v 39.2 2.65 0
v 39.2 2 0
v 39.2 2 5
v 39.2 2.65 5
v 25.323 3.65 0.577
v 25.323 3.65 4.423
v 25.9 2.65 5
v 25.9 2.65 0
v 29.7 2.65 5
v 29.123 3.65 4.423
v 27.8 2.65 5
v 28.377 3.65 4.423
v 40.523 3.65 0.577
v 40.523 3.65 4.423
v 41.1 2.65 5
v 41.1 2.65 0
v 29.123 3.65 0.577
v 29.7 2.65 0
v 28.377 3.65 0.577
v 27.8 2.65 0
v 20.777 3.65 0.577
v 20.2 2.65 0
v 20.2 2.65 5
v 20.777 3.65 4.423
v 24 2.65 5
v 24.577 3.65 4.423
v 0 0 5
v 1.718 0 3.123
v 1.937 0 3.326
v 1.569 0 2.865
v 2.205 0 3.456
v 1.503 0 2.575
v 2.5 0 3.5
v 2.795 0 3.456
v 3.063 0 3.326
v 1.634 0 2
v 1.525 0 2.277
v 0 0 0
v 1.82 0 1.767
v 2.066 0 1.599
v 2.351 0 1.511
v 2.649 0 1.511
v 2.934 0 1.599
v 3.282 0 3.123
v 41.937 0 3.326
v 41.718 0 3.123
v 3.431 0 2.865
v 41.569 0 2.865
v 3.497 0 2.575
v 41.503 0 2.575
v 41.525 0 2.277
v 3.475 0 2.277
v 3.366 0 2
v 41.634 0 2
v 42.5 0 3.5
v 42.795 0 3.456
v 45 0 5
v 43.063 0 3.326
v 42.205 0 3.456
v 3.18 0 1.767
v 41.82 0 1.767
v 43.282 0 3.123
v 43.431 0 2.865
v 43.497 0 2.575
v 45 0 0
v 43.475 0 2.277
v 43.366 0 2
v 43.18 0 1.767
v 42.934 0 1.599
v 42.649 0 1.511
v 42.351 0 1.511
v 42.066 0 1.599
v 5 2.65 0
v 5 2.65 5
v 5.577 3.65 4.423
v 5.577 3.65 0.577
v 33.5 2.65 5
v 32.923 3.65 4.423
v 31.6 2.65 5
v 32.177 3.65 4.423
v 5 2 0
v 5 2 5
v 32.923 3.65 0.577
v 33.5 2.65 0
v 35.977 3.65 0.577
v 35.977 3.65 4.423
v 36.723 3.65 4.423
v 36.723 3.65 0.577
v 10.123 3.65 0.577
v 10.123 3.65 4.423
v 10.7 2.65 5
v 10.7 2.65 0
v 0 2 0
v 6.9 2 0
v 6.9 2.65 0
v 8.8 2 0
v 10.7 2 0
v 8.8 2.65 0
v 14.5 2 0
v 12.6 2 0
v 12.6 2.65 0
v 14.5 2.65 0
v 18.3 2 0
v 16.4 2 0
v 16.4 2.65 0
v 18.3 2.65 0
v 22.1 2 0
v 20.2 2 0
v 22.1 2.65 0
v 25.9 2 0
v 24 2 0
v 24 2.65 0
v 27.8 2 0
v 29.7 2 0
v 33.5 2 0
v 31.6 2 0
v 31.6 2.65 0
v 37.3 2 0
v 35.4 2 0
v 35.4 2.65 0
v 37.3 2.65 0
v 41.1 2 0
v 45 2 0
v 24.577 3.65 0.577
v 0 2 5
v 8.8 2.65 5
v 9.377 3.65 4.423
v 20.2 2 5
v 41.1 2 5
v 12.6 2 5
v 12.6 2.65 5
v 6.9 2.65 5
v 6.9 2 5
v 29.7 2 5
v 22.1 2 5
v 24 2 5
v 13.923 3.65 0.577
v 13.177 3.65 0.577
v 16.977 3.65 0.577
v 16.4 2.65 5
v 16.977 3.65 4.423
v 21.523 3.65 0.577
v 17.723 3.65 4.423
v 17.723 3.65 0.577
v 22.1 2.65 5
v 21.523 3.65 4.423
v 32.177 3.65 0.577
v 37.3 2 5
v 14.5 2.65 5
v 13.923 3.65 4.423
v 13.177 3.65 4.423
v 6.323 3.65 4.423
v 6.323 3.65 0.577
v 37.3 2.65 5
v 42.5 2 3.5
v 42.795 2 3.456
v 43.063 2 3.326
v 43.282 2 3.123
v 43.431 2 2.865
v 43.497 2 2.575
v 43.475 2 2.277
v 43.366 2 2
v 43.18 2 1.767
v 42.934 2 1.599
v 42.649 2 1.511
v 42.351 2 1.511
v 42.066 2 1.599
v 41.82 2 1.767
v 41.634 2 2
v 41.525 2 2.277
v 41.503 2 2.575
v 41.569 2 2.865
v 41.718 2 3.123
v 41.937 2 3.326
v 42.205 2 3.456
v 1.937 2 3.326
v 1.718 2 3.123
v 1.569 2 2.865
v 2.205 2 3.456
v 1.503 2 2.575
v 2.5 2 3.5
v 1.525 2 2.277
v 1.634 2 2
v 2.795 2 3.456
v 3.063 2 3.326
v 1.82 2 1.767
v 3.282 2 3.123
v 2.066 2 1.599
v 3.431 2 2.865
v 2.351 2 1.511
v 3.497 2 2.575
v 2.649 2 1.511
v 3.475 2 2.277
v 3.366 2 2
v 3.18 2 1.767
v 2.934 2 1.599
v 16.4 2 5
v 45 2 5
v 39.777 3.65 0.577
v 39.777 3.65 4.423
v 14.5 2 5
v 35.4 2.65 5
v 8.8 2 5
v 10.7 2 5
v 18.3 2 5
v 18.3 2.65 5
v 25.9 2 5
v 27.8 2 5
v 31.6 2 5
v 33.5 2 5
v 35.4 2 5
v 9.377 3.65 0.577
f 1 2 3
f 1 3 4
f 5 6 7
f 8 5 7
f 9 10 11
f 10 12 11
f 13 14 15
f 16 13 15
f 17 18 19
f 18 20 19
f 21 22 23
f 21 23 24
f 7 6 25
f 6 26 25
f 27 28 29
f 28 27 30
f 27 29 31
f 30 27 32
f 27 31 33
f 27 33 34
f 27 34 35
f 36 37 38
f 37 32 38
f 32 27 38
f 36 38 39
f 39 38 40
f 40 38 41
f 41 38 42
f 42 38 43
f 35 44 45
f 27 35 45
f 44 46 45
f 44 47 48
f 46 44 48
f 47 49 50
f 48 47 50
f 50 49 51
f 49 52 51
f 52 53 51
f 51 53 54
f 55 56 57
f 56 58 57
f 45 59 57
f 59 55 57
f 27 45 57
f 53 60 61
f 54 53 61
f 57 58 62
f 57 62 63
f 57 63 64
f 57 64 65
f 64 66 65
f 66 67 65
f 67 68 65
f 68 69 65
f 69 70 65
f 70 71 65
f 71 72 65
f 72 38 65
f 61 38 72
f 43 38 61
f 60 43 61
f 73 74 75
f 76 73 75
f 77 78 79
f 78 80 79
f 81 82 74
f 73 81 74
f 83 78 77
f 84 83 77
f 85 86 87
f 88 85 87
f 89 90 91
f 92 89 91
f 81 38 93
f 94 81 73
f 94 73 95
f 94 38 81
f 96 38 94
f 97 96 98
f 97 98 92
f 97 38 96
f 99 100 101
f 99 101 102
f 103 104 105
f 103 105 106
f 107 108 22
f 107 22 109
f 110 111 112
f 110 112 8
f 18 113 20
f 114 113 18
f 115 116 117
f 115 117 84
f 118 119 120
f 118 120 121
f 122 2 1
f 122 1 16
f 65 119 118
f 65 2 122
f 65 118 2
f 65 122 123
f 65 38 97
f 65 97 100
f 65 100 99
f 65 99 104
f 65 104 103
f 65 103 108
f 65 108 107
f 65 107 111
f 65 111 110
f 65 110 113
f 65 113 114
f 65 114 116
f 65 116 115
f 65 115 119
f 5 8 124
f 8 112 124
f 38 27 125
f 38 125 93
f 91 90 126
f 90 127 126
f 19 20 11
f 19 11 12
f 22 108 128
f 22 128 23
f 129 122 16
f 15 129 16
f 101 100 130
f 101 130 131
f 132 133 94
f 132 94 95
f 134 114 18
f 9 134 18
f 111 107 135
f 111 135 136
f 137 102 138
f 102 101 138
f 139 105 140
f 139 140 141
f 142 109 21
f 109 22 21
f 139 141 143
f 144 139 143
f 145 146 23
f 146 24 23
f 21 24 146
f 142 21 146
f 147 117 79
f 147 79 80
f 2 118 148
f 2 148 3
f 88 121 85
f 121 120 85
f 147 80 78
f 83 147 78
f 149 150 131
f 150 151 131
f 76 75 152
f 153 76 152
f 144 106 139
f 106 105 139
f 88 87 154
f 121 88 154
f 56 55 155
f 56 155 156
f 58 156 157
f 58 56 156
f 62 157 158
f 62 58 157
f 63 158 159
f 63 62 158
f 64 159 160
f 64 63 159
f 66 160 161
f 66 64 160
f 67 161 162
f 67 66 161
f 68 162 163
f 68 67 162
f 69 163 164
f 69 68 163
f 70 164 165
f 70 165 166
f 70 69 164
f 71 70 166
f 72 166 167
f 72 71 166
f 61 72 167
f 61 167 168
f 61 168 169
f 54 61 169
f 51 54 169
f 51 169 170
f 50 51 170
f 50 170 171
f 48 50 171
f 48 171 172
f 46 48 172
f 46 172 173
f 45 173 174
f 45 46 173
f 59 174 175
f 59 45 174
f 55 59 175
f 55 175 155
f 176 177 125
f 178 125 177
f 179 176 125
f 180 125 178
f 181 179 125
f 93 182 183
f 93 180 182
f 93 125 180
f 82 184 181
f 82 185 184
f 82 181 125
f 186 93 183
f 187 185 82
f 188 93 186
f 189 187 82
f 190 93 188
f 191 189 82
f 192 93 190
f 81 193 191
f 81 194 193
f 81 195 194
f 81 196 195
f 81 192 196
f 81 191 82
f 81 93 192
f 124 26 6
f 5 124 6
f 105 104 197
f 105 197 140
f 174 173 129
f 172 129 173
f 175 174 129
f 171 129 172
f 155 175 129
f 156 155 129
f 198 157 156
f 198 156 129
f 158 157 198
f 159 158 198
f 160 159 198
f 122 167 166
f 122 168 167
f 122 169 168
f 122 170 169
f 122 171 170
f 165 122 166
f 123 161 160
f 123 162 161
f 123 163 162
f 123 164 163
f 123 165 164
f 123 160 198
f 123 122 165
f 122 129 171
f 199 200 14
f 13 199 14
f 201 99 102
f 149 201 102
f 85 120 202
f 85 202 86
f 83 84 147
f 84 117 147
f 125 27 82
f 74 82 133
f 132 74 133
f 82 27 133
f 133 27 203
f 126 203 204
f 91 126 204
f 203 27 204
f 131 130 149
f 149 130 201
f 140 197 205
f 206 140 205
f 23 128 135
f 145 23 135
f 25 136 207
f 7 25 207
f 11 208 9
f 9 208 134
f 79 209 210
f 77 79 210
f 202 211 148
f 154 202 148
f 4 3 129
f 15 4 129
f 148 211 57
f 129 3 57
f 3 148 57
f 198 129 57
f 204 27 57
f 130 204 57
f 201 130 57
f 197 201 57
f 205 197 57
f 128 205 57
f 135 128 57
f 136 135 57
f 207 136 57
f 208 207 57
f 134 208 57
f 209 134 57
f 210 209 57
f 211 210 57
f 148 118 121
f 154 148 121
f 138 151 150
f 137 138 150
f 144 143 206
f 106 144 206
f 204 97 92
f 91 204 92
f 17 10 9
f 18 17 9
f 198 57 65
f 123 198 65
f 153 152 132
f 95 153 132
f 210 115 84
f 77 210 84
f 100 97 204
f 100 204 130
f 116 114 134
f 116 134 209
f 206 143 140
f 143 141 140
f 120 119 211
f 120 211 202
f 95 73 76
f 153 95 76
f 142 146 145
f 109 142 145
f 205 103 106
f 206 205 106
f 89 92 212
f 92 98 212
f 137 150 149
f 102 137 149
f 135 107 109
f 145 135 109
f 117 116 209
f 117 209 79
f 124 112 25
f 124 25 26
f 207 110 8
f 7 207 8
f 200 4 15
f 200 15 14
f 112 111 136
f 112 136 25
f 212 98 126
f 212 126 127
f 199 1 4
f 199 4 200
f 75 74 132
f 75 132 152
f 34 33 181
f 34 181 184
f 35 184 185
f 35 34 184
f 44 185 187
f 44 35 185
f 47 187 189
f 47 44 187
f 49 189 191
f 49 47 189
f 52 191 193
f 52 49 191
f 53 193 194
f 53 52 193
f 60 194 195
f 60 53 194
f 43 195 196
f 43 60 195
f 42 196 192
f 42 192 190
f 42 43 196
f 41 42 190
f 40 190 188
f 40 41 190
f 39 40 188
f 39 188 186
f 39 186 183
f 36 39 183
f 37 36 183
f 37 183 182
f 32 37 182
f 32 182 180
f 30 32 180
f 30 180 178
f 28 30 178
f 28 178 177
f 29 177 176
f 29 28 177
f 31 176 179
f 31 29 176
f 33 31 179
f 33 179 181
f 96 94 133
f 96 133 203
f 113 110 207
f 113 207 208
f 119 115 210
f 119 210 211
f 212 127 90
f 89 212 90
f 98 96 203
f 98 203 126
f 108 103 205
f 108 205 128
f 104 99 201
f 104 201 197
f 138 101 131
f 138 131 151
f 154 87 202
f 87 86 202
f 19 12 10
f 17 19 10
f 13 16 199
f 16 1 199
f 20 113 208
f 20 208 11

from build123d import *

# Parameters (mm, degrees)
SKETCH1_W                    = 45
SKETCH1_H                    = 5
SKETCH1_R                    = 1
BOSS_EXTRUDE1_DEPTH          = 2
SKETCH2_W                    = 1.9
SKETCH2_H                    = 1.65
BOSS_EXTRUDE2_DEPTH          = 5
CHAMFER1_SIZE                = 1
CHAMFER1_SIZE_2              = 0.577350269
LPATTERN1_COUNT              = 10
LPATTERN1_PITCH              = 3.8
CHAMFER1_OF_LPATTERN1_SIZE   = 1
CHAMFER1_OF_LPATTERN1_SIZE_2 = 0.577350269


with BuildPart() as part:
    # Sketch1 → Boss-Extrude1 (new body)
    with BuildSketch(Plane(origin=(0, 0, 0), x_dir=(1, 0, 0), z_dir=(0, 1, 0))):
        with Locations((22.5, -2.5)):
            Rectangle(SKETCH1_W, SKETCH1_H)
        with Locations(Location((2.5, -2.5, 0), (0, 0, 270))):
            Circle(SKETCH1_R, mode=Mode.SUBTRACT)
        with Locations(Location((42.5, -2.5, 0), (0, 0, 270))):
            Circle(SKETCH1_R, mode=Mode.SUBTRACT)
    extrude(amount=BOSS_EXTRUDE1_DEPTH)

    # Sketch2 → Boss-Extrude2 (add)
    with BuildSketch(Plane.XY.offset(5)):
        with Locations((5.95, 2.825)):
            Rectangle(SKETCH2_W, SKETCH2_H)
    boss_extrude2 = extrude(amount=-BOSS_EXTRUDE2_DEPTH)

    # Chamfer1
    # the kernel refuses this chamfer: 1, 0.577350269 mm, written as the material it takes off along each edge
    with BuildSketch(Plane(origin=(2.412914245, 3.65, 0), x_dir=(0, -0.9998132206222079, -0.019326765612700737), z_dir=(1, 0, 0))) as chamfer1_piece_1:
        Polygon((CHAMFER1_SIZE * 0.999813220622, -CHAMFER1_SIZE * 0.0193267656127), (-CHAMFER1_SIZE_2 * 0.019326765619, -CHAMFER1_SIZE_2 * 0.999813220951), (0, 0), align=None)
    extrude(amount=7.074171509, mode=Mode.SUBTRACT)
    with BuildSketch(Plane(origin=(2.412914245, 3.65, 5), x_dir=(0, -0.9998132206222079, 0.01932676561270115), z_dir=(1, 0, 0))) as chamfer1_piece_2:
        Polygon((CHAMFER1_SIZE * 0.999813220622, CHAMFER1_SIZE * 0.0193267656127), (-CHAMFER1_SIZE_2 * 0.019326765619, CHAMFER1_SIZE_2 * 0.999813220951), (0, 0), align=None)
    extrude(amount=7.074171509, mode=Mode.SUBTRACT)
    with BuildSketch(Plane(origin=(6.9, 3.65, 7.587085755), x_dir=(-0.9983227437537925, 0.0578938624026711, 0), z_dir=(0, 0, -1))) as chamfer1_piece_3:
        Polygon((CHAMFER1_SIZE_2 * 0.998322744082, -CHAMFER1_SIZE_2 * 0.0578938624217), (-CHAMFER1_SIZE * 0.0578938624027, -CHAMFER1_SIZE * 0.998322743754), (0, 0), align=None)
    extrude(amount=10.174171509, mode=Mode.SUBTRACT)
    with BuildSketch(Plane(origin=(5, 3.65, 7.587085755), x_dir=(-0.01932676561270115, -0.9998132206222079, 0), z_dir=(0, 0, -1))) as chamfer1_piece_4:
        Polygon((CHAMFER1_SIZE * 0.999813220622, -CHAMFER1_SIZE * 0.0193267656127), (-CHAMFER1_SIZE_2 * 0.019326765619, -CHAMFER1_SIZE_2 * 0.999813220951), (0, 0), align=None)
    extrude(amount=10.174171509, mode=Mode.SUBTRACT)

    # LPattern1: Boss-Extrude2 ×10
    with Locations(*[(i * LPATTERN1_PITCH, 0, 0) for i in range(1, LPATTERN1_COUNT)]):
        add(boss_extrude2)

    # Chamfer1 of LPattern1
    # the kernel refuses this chamfer: 1, 0.577350269 mm, written as the material it takes off along each edge
    with BuildSketch(Plane(origin=(6.212914245, 3.65, 0), x_dir=(0, -0.9998132206222079, -0.019326765612700737), z_dir=(1, 0, 0)), Plane(origin=(10.012914245, 3.65, 0), x_dir=(0, -0.9998132206222079, -0.019326765612700737), z_dir=(1, 0, 0)), Plane(origin=(13.812914245, 3.65, 0), x_dir=(0, -0.9998132206222079, -0.019326765612700737), z_dir=(1, 0, 0)), Plane(origin=(17.612914245, 3.65, 0), x_dir=(0, -0.9998132206222079, -0.019326765612700737), z_dir=(1, 0, 0)), Plane(origin=(21.412914245, 3.65, 0), x_dir=(0, -0.9998132206222079, -0.019326765612700737), z_dir=(1, 0, 0)), Plane(origin=(25.212914245, 3.65, 0), x_dir=(0, -0.9998132206222079, -0.019326765612700737), z_dir=(1, 0, 0)), Plane(origin=(29.012914245, 3.65, 0), x_dir=(0, -0.9998132206222079, -0.019326765612700737), z_dir=(1, 0, 0)), Plane(origin=(32.812914245, 3.65, 0), x_dir=(0, -0.9998132206222079, -0.019326765612700737), z_dir=(1, 0, 0)), Plane(origin=(36.612914245, 3.65, 0), x_dir=(0, -0.9998132206222079, -0.019326765612700737), z_dir=(1, 0, 0))) as chamfer1_of_lpattern1_piece_1:
        Polygon((CHAMFER1_OF_LPATTERN1_SIZE * 0.999813220622, -CHAMFER1_OF_LPATTERN1_SIZE * 0.0193267656127), (-CHAMFER1_OF_LPATTERN1_SIZE_2 * 0.019326765619, -CHAMFER1_OF_LPATTERN1_SIZE_2 * 0.999813220951), (0, 0), align=None)
    extrude(amount=7.074171509, mode=Mode.SUBTRACT)
    with BuildSketch(Plane(origin=(6.212914245, 3.65, 5), x_dir=(0, 0.0578938624026711, -0.9983227437537925), z_dir=(1, 0, 0)), Plane(origin=(10.012914245, 3.65, 5), x_dir=(0, 0.0578938624026711, -0.9983227437537925), z_dir=(1, 0, 0)), Plane(origin=(13.812914245, 3.65, 5), x_dir=(0, 0.0578938624026711, -0.9983227437537925), z_dir=(1, 0, 0)), Plane(origin=(17.612914245, 3.65, 5), x_dir=(0, 0.0578938624026711, -0.9983227437537925), z_dir=(1, 0, 0)), Plane(origin=(21.412914245, 3.65, 5), x_dir=(0, 0.0578938624026711, -0.9983227437537925), z_dir=(1, 0, 0)), Plane(origin=(25.212914245, 3.65, 5), x_dir=(0, 0.0578938624026711, -0.9983227437537925), z_dir=(1, 0, 0)), Plane(origin=(29.012914245, 3.65, 5), x_dir=(0, 0.0578938624026711, -0.9983227437537925), z_dir=(1, 0, 0)), Plane(origin=(32.812914245, 3.65, 5), x_dir=(0, 0.0578938624026711, -0.9983227437537925), z_dir=(1, 0, 0))) as chamfer1_of_lpattern1_piece_2:
        Polygon((CHAMFER1_OF_LPATTERN1_SIZE_2 * 0.998322744082, -CHAMFER1_OF_LPATTERN1_SIZE_2 * 0.0578938624217), (-CHAMFER1_OF_LPATTERN1_SIZE * 0.0578938624027, -CHAMFER1_OF_LPATTERN1_SIZE * 0.998322743754), (0, 0), align=None)
    extrude(amount=7.074171509, mode=Mode.SUBTRACT)
    with BuildSketch(Plane(origin=(10.7, 3.65, 7.587085755), x_dir=(-0.9983227437537925, 0.0578938624026711, 0), z_dir=(0, 0, -1)), Plane(origin=(14.5, 3.65, 7.587085755), x_dir=(-0.9983227437537925, 0.0578938624026711, 0), z_dir=(0, 0, -1)), Plane(origin=(18.3, 3.65, 7.587085755), x_dir=(-0.9983227437537925, 0.057893862402671276, 0), z_dir=(0, 0, -1)), Plane(origin=(22.1, 3.65, 7.587085755), x_dir=(-0.9983227437537925, 0.057893862402671276, 0), z_dir=(0, 0, -1)), Plane(origin=(25.9, 3.65, 7.587085755), x_dir=(-0.9983227437537925, 0.057893862402671276, 0), z_dir=(0, 0, -1)), Plane(origin=(29.7, 3.65, 7.587085755), x_dir=(-0.9983227437537925, 0.057893862402671276, 0), z_dir=(0, 0, -1)), Plane(origin=(33.5, 3.65, 7.587085755), x_dir=(-0.9983227437537927, 0.05789386240266986, 0), z_dir=(0, 0, -1)), Plane(origin=(37.3, 3.65, 7.587085755), x_dir=(-0.9983227437537927, 0.05789386240266986, 0), z_dir=(0, 0, -1)), Plane(origin=(41.1, 3.65, 7.587085755), x_dir=(-0.9983227437537927, 0.05789386240266986, 0), z_dir=(0, 0, -1))) as chamfer1_of_lpattern1_piece_3:
        Polygon((CHAMFER1_OF_LPATTERN1_SIZE_2 * 0.998322744082, -CHAMFER1_OF_LPATTERN1_SIZE_2 * 0.0578938624217), (-CHAMFER1_OF_LPATTERN1_SIZE * 0.0578938624027, -CHAMFER1_OF_LPATTERN1_SIZE * 0.998322743754), (0, 0), align=None)
    extrude(amount=10.174171509, mode=Mode.SUBTRACT)
    with BuildSketch(Plane(origin=(8.8, 3.65, 7.587085755), x_dir=(-0.01932676561270029, -0.9998132206222079, 0), z_dir=(0, 0, -1)), Plane(origin=(12.6, 3.65, 7.587085755), x_dir=(-0.01932676561270029, -0.9998132206222079, 0), z_dir=(0, 0, -1)), Plane(origin=(16.4, 3.65, 7.587085755), x_dir=(-0.01932676561270029, -0.9998132206222079, 0), z_dir=(0, 0, -1)), Plane(origin=(20.2, 3.65, 7.587085755), x_dir=(-0.01932676561270029, -0.9998132206222079, 0), z_dir=(0, 0, -1)), Plane(origin=(24, 3.65, 7.587085755), x_dir=(-0.01932676561270029, -0.9998132206222079, 0), z_dir=(0, 0, -1)), Plane(origin=(27.8, 3.65, 7.587085755), x_dir=(-0.01932676561270029, -0.9998132206222079, 0), z_dir=(0, 0, -1)), Plane(origin=(31.6, 3.65, 7.587085755), x_dir=(-0.0193267656127003, -0.9998132206222079, 0), z_dir=(0, 0, -1)), Plane(origin=(35.4, 3.65, 7.587085755), x_dir=(-0.01932676561270373, -0.9998132206222079, 0), z_dir=(0, 0, -1)), Plane(origin=(39.2, 3.65, 7.587085755), x_dir=(-0.01932676561270373, -0.9998132206222079, 0), z_dir=(0, 0, -1))) as chamfer1_of_lpattern1_piece_4:
        Polygon((CHAMFER1_OF_LPATTERN1_SIZE * 0.999813220622, -CHAMFER1_OF_LPATTERN1_SIZE * 0.0193267656127), (-CHAMFER1_OF_LPATTERN1_SIZE_2 * 0.019326765619, -CHAMFER1_OF_LPATTERN1_SIZE_2 * 0.999813220951), (0, 0), align=None)
    extrude(amount=10.174171509, mode=Mode.SUBTRACT)
    with BuildSketch(Plane(origin=(36.612914245, 3.65, 5), x_dir=(0, -0.9998132206222079, 0.01932676561270115), z_dir=(1, 0, 0))) as chamfer1_of_lpattern1_piece_5:
        Polygon((CHAMFER1_OF_LPATTERN1_SIZE * 0.999813220622, CHAMFER1_OF_LPATTERN1_SIZE * 0.0193267656127), (-CHAMFER1_OF_LPATTERN1_SIZE_2 * 0.019326765619, CHAMFER1_OF_LPATTERN1_SIZE_2 * 0.999813220951), (0, 0), align=None)
    extrude(amount=7.074171509, mode=Mode.SUBTRACT)


solid = part.part
